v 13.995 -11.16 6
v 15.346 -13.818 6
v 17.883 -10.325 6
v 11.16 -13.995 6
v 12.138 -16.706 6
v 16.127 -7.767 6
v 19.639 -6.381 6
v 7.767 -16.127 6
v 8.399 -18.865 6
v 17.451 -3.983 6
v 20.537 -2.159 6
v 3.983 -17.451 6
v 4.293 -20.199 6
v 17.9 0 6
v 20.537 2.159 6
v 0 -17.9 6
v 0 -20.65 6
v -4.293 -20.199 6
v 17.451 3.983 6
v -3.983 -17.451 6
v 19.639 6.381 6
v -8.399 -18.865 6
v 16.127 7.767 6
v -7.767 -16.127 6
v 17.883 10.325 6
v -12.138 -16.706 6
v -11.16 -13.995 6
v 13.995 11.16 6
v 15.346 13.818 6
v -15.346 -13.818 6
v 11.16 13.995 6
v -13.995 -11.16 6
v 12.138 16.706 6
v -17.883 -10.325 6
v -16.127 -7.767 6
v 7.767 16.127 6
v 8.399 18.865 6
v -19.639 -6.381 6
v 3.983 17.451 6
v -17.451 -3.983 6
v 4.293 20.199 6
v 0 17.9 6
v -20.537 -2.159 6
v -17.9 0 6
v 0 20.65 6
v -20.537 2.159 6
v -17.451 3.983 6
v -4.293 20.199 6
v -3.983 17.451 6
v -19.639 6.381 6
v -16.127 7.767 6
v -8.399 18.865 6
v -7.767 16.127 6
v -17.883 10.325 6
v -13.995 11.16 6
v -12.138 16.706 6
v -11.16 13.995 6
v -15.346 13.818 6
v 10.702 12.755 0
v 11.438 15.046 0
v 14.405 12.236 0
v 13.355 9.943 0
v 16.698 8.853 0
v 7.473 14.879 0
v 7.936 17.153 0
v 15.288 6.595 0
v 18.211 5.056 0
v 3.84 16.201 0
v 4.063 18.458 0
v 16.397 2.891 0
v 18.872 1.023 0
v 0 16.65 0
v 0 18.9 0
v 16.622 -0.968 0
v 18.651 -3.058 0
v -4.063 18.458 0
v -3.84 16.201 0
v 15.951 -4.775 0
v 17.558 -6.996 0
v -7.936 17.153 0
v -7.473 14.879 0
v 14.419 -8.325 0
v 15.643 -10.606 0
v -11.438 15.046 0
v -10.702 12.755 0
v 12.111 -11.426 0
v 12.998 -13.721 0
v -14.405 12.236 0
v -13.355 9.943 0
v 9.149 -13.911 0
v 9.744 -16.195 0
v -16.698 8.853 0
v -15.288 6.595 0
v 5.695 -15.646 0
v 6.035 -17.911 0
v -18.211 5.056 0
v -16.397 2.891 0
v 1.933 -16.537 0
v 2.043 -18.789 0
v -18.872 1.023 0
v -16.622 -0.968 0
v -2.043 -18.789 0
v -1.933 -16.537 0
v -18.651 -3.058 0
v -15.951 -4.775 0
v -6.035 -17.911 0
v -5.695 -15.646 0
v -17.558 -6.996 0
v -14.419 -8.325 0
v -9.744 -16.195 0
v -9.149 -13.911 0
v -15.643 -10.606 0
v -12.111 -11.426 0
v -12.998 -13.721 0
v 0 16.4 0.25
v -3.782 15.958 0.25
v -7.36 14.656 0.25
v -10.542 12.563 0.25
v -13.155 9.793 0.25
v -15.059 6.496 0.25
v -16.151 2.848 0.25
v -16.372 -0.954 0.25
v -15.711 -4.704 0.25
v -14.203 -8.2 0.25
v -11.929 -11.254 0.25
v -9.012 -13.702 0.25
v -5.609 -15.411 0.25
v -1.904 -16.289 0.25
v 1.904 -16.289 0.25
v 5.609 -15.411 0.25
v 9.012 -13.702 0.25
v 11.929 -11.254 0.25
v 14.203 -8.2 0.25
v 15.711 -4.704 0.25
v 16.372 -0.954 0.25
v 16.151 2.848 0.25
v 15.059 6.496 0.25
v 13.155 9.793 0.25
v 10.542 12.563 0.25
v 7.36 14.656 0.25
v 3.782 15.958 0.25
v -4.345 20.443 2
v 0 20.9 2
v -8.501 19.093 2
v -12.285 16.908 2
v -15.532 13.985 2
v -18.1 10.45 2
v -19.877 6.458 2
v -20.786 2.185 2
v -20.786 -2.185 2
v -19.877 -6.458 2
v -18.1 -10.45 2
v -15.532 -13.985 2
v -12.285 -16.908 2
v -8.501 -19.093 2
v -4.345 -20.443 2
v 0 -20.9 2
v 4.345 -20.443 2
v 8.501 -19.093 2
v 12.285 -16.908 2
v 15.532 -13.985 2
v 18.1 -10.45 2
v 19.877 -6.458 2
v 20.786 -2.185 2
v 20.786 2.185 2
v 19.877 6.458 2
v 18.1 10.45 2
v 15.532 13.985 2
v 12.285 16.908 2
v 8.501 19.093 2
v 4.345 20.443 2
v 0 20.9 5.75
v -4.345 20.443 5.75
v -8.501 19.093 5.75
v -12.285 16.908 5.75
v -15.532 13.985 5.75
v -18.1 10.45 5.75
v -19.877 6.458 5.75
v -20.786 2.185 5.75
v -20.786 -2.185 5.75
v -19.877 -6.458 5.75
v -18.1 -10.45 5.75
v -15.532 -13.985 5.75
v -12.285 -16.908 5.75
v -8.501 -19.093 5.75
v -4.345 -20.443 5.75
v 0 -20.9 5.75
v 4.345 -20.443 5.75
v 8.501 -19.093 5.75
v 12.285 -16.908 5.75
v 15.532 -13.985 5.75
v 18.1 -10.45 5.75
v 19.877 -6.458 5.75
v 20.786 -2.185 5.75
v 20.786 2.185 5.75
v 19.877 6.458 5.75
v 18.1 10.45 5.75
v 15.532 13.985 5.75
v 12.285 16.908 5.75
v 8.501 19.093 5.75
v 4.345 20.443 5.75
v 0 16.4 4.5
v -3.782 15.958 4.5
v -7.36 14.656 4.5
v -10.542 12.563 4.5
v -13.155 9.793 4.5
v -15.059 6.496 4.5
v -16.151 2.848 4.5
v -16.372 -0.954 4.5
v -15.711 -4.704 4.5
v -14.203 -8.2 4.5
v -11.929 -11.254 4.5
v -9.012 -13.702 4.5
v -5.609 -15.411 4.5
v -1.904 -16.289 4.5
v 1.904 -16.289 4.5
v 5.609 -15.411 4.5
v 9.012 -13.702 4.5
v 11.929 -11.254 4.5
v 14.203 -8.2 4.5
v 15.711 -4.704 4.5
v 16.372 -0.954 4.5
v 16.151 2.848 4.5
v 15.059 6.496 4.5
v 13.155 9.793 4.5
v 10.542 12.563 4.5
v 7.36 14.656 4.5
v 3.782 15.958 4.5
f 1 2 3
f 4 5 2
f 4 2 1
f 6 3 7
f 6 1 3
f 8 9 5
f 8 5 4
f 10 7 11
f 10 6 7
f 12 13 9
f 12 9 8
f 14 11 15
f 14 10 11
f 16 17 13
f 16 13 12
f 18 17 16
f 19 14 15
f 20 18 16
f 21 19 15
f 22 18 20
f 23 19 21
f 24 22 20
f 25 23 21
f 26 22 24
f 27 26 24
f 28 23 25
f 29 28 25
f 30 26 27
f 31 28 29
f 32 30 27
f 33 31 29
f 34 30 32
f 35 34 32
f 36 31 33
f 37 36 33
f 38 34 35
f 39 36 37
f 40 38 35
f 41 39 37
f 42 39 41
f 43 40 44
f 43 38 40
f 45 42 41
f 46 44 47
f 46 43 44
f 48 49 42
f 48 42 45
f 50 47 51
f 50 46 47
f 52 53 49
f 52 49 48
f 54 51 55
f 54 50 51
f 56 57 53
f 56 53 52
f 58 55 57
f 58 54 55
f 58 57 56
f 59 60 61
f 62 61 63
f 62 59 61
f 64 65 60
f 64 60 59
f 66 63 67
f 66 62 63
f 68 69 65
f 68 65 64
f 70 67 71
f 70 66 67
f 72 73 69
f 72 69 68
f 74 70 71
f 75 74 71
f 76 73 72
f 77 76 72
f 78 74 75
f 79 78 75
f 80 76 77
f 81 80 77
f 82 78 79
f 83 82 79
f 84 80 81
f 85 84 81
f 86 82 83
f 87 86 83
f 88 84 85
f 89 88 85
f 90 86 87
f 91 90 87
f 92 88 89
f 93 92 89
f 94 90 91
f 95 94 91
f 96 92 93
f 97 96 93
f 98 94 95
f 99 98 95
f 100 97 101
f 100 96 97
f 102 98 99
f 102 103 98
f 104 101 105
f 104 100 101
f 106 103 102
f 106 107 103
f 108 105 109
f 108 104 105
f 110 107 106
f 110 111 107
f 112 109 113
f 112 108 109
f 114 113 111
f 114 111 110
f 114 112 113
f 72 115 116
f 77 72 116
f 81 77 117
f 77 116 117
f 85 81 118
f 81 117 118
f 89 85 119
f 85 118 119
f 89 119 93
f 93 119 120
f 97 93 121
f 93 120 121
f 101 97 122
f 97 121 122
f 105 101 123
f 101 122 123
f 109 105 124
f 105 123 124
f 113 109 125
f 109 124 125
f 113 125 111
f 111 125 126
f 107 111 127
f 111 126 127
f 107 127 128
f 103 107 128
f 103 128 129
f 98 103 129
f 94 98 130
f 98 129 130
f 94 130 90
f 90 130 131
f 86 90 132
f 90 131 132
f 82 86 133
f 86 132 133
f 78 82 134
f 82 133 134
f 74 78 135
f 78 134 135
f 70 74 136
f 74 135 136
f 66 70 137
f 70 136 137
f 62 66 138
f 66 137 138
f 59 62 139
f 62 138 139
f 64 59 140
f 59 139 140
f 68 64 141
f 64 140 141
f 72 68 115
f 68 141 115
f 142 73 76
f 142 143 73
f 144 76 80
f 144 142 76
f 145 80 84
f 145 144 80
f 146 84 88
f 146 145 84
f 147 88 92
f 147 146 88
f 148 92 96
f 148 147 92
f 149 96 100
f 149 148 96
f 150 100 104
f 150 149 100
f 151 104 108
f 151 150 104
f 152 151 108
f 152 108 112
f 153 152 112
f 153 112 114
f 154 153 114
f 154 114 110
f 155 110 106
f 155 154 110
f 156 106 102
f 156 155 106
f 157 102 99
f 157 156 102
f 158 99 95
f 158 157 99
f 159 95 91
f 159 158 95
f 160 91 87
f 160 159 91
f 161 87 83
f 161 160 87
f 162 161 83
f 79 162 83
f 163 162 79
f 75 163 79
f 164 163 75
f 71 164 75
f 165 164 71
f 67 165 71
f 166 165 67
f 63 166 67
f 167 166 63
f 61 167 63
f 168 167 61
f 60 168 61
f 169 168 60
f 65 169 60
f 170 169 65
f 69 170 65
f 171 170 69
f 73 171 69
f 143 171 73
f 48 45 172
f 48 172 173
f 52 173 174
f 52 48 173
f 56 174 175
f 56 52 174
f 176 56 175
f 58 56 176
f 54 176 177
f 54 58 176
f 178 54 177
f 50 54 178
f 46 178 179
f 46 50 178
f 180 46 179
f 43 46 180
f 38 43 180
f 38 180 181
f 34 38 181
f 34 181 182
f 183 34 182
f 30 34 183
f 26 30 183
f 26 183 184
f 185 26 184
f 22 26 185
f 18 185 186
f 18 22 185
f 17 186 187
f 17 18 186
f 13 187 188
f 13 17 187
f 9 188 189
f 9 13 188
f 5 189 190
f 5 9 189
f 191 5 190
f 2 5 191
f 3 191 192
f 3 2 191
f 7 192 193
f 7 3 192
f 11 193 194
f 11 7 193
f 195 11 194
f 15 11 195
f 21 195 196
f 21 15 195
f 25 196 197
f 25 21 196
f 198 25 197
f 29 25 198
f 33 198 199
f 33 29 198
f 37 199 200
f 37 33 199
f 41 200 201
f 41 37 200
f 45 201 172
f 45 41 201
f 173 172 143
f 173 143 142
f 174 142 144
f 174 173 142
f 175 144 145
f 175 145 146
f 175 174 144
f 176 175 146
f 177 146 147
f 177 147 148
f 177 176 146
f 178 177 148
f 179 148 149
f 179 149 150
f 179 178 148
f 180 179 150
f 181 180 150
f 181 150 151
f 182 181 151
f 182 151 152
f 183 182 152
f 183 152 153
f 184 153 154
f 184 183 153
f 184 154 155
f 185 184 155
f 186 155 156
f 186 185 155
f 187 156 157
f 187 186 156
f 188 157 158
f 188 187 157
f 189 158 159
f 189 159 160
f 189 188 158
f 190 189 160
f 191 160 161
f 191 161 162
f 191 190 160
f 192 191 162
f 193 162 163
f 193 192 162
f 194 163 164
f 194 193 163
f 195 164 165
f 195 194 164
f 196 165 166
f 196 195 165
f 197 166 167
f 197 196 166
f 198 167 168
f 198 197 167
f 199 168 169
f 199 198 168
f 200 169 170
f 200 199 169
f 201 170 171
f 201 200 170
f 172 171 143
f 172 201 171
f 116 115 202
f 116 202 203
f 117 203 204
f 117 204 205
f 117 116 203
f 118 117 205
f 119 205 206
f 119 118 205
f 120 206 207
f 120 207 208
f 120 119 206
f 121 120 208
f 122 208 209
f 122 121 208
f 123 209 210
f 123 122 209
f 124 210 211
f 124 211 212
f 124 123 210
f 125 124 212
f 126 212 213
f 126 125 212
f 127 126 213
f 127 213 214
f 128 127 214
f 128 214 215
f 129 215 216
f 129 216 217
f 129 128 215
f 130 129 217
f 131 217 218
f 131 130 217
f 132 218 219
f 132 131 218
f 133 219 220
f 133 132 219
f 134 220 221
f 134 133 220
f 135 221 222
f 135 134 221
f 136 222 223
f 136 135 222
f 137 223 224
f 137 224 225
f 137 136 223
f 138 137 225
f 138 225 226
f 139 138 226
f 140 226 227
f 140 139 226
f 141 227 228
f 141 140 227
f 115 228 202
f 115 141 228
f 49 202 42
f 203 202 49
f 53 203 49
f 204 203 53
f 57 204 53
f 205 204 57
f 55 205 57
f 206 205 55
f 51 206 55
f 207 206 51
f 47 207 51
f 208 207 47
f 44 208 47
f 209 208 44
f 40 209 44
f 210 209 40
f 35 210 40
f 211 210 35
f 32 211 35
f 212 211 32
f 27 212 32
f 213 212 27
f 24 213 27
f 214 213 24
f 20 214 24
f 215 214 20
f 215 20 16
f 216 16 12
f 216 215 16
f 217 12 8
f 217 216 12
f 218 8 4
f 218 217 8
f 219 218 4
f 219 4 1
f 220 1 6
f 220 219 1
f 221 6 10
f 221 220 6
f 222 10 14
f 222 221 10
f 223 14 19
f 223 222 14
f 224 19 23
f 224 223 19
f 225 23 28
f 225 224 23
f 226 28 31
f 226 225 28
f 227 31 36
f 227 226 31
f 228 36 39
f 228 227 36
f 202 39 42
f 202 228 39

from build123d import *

# Parameters (mm, degrees)
F2_SIZE = 0.25
F3_SIZE = 0.25


with BuildPart() as f1:
    # F0 (on Right) → F1 (revolve)
    with BuildSketch(Plane.YZ):
        Polygon((17.9, 6), (16.4, 4.5), (16.4, 0), (18.9, 0), (20.9, 2), (20.9, 6), align=None)
    revolve(axis=Axis((0, 0, 6.363279), (0, 0, 1)))

    # F2
    f2_edges = [f1.edges().sort_by_distance(p)[0] for p in [
        (0, -20.9, 6),
    ]]
    chamfer(f2_edges, length=F2_SIZE)

    # F3
    f3_edges = [f1.edges().sort_by_distance(p)[0] for p in [
        (0, -16.4, 0),
    ]]
    chamfer(f3_edges, length=F3_SIZE)


solid = f1.part
